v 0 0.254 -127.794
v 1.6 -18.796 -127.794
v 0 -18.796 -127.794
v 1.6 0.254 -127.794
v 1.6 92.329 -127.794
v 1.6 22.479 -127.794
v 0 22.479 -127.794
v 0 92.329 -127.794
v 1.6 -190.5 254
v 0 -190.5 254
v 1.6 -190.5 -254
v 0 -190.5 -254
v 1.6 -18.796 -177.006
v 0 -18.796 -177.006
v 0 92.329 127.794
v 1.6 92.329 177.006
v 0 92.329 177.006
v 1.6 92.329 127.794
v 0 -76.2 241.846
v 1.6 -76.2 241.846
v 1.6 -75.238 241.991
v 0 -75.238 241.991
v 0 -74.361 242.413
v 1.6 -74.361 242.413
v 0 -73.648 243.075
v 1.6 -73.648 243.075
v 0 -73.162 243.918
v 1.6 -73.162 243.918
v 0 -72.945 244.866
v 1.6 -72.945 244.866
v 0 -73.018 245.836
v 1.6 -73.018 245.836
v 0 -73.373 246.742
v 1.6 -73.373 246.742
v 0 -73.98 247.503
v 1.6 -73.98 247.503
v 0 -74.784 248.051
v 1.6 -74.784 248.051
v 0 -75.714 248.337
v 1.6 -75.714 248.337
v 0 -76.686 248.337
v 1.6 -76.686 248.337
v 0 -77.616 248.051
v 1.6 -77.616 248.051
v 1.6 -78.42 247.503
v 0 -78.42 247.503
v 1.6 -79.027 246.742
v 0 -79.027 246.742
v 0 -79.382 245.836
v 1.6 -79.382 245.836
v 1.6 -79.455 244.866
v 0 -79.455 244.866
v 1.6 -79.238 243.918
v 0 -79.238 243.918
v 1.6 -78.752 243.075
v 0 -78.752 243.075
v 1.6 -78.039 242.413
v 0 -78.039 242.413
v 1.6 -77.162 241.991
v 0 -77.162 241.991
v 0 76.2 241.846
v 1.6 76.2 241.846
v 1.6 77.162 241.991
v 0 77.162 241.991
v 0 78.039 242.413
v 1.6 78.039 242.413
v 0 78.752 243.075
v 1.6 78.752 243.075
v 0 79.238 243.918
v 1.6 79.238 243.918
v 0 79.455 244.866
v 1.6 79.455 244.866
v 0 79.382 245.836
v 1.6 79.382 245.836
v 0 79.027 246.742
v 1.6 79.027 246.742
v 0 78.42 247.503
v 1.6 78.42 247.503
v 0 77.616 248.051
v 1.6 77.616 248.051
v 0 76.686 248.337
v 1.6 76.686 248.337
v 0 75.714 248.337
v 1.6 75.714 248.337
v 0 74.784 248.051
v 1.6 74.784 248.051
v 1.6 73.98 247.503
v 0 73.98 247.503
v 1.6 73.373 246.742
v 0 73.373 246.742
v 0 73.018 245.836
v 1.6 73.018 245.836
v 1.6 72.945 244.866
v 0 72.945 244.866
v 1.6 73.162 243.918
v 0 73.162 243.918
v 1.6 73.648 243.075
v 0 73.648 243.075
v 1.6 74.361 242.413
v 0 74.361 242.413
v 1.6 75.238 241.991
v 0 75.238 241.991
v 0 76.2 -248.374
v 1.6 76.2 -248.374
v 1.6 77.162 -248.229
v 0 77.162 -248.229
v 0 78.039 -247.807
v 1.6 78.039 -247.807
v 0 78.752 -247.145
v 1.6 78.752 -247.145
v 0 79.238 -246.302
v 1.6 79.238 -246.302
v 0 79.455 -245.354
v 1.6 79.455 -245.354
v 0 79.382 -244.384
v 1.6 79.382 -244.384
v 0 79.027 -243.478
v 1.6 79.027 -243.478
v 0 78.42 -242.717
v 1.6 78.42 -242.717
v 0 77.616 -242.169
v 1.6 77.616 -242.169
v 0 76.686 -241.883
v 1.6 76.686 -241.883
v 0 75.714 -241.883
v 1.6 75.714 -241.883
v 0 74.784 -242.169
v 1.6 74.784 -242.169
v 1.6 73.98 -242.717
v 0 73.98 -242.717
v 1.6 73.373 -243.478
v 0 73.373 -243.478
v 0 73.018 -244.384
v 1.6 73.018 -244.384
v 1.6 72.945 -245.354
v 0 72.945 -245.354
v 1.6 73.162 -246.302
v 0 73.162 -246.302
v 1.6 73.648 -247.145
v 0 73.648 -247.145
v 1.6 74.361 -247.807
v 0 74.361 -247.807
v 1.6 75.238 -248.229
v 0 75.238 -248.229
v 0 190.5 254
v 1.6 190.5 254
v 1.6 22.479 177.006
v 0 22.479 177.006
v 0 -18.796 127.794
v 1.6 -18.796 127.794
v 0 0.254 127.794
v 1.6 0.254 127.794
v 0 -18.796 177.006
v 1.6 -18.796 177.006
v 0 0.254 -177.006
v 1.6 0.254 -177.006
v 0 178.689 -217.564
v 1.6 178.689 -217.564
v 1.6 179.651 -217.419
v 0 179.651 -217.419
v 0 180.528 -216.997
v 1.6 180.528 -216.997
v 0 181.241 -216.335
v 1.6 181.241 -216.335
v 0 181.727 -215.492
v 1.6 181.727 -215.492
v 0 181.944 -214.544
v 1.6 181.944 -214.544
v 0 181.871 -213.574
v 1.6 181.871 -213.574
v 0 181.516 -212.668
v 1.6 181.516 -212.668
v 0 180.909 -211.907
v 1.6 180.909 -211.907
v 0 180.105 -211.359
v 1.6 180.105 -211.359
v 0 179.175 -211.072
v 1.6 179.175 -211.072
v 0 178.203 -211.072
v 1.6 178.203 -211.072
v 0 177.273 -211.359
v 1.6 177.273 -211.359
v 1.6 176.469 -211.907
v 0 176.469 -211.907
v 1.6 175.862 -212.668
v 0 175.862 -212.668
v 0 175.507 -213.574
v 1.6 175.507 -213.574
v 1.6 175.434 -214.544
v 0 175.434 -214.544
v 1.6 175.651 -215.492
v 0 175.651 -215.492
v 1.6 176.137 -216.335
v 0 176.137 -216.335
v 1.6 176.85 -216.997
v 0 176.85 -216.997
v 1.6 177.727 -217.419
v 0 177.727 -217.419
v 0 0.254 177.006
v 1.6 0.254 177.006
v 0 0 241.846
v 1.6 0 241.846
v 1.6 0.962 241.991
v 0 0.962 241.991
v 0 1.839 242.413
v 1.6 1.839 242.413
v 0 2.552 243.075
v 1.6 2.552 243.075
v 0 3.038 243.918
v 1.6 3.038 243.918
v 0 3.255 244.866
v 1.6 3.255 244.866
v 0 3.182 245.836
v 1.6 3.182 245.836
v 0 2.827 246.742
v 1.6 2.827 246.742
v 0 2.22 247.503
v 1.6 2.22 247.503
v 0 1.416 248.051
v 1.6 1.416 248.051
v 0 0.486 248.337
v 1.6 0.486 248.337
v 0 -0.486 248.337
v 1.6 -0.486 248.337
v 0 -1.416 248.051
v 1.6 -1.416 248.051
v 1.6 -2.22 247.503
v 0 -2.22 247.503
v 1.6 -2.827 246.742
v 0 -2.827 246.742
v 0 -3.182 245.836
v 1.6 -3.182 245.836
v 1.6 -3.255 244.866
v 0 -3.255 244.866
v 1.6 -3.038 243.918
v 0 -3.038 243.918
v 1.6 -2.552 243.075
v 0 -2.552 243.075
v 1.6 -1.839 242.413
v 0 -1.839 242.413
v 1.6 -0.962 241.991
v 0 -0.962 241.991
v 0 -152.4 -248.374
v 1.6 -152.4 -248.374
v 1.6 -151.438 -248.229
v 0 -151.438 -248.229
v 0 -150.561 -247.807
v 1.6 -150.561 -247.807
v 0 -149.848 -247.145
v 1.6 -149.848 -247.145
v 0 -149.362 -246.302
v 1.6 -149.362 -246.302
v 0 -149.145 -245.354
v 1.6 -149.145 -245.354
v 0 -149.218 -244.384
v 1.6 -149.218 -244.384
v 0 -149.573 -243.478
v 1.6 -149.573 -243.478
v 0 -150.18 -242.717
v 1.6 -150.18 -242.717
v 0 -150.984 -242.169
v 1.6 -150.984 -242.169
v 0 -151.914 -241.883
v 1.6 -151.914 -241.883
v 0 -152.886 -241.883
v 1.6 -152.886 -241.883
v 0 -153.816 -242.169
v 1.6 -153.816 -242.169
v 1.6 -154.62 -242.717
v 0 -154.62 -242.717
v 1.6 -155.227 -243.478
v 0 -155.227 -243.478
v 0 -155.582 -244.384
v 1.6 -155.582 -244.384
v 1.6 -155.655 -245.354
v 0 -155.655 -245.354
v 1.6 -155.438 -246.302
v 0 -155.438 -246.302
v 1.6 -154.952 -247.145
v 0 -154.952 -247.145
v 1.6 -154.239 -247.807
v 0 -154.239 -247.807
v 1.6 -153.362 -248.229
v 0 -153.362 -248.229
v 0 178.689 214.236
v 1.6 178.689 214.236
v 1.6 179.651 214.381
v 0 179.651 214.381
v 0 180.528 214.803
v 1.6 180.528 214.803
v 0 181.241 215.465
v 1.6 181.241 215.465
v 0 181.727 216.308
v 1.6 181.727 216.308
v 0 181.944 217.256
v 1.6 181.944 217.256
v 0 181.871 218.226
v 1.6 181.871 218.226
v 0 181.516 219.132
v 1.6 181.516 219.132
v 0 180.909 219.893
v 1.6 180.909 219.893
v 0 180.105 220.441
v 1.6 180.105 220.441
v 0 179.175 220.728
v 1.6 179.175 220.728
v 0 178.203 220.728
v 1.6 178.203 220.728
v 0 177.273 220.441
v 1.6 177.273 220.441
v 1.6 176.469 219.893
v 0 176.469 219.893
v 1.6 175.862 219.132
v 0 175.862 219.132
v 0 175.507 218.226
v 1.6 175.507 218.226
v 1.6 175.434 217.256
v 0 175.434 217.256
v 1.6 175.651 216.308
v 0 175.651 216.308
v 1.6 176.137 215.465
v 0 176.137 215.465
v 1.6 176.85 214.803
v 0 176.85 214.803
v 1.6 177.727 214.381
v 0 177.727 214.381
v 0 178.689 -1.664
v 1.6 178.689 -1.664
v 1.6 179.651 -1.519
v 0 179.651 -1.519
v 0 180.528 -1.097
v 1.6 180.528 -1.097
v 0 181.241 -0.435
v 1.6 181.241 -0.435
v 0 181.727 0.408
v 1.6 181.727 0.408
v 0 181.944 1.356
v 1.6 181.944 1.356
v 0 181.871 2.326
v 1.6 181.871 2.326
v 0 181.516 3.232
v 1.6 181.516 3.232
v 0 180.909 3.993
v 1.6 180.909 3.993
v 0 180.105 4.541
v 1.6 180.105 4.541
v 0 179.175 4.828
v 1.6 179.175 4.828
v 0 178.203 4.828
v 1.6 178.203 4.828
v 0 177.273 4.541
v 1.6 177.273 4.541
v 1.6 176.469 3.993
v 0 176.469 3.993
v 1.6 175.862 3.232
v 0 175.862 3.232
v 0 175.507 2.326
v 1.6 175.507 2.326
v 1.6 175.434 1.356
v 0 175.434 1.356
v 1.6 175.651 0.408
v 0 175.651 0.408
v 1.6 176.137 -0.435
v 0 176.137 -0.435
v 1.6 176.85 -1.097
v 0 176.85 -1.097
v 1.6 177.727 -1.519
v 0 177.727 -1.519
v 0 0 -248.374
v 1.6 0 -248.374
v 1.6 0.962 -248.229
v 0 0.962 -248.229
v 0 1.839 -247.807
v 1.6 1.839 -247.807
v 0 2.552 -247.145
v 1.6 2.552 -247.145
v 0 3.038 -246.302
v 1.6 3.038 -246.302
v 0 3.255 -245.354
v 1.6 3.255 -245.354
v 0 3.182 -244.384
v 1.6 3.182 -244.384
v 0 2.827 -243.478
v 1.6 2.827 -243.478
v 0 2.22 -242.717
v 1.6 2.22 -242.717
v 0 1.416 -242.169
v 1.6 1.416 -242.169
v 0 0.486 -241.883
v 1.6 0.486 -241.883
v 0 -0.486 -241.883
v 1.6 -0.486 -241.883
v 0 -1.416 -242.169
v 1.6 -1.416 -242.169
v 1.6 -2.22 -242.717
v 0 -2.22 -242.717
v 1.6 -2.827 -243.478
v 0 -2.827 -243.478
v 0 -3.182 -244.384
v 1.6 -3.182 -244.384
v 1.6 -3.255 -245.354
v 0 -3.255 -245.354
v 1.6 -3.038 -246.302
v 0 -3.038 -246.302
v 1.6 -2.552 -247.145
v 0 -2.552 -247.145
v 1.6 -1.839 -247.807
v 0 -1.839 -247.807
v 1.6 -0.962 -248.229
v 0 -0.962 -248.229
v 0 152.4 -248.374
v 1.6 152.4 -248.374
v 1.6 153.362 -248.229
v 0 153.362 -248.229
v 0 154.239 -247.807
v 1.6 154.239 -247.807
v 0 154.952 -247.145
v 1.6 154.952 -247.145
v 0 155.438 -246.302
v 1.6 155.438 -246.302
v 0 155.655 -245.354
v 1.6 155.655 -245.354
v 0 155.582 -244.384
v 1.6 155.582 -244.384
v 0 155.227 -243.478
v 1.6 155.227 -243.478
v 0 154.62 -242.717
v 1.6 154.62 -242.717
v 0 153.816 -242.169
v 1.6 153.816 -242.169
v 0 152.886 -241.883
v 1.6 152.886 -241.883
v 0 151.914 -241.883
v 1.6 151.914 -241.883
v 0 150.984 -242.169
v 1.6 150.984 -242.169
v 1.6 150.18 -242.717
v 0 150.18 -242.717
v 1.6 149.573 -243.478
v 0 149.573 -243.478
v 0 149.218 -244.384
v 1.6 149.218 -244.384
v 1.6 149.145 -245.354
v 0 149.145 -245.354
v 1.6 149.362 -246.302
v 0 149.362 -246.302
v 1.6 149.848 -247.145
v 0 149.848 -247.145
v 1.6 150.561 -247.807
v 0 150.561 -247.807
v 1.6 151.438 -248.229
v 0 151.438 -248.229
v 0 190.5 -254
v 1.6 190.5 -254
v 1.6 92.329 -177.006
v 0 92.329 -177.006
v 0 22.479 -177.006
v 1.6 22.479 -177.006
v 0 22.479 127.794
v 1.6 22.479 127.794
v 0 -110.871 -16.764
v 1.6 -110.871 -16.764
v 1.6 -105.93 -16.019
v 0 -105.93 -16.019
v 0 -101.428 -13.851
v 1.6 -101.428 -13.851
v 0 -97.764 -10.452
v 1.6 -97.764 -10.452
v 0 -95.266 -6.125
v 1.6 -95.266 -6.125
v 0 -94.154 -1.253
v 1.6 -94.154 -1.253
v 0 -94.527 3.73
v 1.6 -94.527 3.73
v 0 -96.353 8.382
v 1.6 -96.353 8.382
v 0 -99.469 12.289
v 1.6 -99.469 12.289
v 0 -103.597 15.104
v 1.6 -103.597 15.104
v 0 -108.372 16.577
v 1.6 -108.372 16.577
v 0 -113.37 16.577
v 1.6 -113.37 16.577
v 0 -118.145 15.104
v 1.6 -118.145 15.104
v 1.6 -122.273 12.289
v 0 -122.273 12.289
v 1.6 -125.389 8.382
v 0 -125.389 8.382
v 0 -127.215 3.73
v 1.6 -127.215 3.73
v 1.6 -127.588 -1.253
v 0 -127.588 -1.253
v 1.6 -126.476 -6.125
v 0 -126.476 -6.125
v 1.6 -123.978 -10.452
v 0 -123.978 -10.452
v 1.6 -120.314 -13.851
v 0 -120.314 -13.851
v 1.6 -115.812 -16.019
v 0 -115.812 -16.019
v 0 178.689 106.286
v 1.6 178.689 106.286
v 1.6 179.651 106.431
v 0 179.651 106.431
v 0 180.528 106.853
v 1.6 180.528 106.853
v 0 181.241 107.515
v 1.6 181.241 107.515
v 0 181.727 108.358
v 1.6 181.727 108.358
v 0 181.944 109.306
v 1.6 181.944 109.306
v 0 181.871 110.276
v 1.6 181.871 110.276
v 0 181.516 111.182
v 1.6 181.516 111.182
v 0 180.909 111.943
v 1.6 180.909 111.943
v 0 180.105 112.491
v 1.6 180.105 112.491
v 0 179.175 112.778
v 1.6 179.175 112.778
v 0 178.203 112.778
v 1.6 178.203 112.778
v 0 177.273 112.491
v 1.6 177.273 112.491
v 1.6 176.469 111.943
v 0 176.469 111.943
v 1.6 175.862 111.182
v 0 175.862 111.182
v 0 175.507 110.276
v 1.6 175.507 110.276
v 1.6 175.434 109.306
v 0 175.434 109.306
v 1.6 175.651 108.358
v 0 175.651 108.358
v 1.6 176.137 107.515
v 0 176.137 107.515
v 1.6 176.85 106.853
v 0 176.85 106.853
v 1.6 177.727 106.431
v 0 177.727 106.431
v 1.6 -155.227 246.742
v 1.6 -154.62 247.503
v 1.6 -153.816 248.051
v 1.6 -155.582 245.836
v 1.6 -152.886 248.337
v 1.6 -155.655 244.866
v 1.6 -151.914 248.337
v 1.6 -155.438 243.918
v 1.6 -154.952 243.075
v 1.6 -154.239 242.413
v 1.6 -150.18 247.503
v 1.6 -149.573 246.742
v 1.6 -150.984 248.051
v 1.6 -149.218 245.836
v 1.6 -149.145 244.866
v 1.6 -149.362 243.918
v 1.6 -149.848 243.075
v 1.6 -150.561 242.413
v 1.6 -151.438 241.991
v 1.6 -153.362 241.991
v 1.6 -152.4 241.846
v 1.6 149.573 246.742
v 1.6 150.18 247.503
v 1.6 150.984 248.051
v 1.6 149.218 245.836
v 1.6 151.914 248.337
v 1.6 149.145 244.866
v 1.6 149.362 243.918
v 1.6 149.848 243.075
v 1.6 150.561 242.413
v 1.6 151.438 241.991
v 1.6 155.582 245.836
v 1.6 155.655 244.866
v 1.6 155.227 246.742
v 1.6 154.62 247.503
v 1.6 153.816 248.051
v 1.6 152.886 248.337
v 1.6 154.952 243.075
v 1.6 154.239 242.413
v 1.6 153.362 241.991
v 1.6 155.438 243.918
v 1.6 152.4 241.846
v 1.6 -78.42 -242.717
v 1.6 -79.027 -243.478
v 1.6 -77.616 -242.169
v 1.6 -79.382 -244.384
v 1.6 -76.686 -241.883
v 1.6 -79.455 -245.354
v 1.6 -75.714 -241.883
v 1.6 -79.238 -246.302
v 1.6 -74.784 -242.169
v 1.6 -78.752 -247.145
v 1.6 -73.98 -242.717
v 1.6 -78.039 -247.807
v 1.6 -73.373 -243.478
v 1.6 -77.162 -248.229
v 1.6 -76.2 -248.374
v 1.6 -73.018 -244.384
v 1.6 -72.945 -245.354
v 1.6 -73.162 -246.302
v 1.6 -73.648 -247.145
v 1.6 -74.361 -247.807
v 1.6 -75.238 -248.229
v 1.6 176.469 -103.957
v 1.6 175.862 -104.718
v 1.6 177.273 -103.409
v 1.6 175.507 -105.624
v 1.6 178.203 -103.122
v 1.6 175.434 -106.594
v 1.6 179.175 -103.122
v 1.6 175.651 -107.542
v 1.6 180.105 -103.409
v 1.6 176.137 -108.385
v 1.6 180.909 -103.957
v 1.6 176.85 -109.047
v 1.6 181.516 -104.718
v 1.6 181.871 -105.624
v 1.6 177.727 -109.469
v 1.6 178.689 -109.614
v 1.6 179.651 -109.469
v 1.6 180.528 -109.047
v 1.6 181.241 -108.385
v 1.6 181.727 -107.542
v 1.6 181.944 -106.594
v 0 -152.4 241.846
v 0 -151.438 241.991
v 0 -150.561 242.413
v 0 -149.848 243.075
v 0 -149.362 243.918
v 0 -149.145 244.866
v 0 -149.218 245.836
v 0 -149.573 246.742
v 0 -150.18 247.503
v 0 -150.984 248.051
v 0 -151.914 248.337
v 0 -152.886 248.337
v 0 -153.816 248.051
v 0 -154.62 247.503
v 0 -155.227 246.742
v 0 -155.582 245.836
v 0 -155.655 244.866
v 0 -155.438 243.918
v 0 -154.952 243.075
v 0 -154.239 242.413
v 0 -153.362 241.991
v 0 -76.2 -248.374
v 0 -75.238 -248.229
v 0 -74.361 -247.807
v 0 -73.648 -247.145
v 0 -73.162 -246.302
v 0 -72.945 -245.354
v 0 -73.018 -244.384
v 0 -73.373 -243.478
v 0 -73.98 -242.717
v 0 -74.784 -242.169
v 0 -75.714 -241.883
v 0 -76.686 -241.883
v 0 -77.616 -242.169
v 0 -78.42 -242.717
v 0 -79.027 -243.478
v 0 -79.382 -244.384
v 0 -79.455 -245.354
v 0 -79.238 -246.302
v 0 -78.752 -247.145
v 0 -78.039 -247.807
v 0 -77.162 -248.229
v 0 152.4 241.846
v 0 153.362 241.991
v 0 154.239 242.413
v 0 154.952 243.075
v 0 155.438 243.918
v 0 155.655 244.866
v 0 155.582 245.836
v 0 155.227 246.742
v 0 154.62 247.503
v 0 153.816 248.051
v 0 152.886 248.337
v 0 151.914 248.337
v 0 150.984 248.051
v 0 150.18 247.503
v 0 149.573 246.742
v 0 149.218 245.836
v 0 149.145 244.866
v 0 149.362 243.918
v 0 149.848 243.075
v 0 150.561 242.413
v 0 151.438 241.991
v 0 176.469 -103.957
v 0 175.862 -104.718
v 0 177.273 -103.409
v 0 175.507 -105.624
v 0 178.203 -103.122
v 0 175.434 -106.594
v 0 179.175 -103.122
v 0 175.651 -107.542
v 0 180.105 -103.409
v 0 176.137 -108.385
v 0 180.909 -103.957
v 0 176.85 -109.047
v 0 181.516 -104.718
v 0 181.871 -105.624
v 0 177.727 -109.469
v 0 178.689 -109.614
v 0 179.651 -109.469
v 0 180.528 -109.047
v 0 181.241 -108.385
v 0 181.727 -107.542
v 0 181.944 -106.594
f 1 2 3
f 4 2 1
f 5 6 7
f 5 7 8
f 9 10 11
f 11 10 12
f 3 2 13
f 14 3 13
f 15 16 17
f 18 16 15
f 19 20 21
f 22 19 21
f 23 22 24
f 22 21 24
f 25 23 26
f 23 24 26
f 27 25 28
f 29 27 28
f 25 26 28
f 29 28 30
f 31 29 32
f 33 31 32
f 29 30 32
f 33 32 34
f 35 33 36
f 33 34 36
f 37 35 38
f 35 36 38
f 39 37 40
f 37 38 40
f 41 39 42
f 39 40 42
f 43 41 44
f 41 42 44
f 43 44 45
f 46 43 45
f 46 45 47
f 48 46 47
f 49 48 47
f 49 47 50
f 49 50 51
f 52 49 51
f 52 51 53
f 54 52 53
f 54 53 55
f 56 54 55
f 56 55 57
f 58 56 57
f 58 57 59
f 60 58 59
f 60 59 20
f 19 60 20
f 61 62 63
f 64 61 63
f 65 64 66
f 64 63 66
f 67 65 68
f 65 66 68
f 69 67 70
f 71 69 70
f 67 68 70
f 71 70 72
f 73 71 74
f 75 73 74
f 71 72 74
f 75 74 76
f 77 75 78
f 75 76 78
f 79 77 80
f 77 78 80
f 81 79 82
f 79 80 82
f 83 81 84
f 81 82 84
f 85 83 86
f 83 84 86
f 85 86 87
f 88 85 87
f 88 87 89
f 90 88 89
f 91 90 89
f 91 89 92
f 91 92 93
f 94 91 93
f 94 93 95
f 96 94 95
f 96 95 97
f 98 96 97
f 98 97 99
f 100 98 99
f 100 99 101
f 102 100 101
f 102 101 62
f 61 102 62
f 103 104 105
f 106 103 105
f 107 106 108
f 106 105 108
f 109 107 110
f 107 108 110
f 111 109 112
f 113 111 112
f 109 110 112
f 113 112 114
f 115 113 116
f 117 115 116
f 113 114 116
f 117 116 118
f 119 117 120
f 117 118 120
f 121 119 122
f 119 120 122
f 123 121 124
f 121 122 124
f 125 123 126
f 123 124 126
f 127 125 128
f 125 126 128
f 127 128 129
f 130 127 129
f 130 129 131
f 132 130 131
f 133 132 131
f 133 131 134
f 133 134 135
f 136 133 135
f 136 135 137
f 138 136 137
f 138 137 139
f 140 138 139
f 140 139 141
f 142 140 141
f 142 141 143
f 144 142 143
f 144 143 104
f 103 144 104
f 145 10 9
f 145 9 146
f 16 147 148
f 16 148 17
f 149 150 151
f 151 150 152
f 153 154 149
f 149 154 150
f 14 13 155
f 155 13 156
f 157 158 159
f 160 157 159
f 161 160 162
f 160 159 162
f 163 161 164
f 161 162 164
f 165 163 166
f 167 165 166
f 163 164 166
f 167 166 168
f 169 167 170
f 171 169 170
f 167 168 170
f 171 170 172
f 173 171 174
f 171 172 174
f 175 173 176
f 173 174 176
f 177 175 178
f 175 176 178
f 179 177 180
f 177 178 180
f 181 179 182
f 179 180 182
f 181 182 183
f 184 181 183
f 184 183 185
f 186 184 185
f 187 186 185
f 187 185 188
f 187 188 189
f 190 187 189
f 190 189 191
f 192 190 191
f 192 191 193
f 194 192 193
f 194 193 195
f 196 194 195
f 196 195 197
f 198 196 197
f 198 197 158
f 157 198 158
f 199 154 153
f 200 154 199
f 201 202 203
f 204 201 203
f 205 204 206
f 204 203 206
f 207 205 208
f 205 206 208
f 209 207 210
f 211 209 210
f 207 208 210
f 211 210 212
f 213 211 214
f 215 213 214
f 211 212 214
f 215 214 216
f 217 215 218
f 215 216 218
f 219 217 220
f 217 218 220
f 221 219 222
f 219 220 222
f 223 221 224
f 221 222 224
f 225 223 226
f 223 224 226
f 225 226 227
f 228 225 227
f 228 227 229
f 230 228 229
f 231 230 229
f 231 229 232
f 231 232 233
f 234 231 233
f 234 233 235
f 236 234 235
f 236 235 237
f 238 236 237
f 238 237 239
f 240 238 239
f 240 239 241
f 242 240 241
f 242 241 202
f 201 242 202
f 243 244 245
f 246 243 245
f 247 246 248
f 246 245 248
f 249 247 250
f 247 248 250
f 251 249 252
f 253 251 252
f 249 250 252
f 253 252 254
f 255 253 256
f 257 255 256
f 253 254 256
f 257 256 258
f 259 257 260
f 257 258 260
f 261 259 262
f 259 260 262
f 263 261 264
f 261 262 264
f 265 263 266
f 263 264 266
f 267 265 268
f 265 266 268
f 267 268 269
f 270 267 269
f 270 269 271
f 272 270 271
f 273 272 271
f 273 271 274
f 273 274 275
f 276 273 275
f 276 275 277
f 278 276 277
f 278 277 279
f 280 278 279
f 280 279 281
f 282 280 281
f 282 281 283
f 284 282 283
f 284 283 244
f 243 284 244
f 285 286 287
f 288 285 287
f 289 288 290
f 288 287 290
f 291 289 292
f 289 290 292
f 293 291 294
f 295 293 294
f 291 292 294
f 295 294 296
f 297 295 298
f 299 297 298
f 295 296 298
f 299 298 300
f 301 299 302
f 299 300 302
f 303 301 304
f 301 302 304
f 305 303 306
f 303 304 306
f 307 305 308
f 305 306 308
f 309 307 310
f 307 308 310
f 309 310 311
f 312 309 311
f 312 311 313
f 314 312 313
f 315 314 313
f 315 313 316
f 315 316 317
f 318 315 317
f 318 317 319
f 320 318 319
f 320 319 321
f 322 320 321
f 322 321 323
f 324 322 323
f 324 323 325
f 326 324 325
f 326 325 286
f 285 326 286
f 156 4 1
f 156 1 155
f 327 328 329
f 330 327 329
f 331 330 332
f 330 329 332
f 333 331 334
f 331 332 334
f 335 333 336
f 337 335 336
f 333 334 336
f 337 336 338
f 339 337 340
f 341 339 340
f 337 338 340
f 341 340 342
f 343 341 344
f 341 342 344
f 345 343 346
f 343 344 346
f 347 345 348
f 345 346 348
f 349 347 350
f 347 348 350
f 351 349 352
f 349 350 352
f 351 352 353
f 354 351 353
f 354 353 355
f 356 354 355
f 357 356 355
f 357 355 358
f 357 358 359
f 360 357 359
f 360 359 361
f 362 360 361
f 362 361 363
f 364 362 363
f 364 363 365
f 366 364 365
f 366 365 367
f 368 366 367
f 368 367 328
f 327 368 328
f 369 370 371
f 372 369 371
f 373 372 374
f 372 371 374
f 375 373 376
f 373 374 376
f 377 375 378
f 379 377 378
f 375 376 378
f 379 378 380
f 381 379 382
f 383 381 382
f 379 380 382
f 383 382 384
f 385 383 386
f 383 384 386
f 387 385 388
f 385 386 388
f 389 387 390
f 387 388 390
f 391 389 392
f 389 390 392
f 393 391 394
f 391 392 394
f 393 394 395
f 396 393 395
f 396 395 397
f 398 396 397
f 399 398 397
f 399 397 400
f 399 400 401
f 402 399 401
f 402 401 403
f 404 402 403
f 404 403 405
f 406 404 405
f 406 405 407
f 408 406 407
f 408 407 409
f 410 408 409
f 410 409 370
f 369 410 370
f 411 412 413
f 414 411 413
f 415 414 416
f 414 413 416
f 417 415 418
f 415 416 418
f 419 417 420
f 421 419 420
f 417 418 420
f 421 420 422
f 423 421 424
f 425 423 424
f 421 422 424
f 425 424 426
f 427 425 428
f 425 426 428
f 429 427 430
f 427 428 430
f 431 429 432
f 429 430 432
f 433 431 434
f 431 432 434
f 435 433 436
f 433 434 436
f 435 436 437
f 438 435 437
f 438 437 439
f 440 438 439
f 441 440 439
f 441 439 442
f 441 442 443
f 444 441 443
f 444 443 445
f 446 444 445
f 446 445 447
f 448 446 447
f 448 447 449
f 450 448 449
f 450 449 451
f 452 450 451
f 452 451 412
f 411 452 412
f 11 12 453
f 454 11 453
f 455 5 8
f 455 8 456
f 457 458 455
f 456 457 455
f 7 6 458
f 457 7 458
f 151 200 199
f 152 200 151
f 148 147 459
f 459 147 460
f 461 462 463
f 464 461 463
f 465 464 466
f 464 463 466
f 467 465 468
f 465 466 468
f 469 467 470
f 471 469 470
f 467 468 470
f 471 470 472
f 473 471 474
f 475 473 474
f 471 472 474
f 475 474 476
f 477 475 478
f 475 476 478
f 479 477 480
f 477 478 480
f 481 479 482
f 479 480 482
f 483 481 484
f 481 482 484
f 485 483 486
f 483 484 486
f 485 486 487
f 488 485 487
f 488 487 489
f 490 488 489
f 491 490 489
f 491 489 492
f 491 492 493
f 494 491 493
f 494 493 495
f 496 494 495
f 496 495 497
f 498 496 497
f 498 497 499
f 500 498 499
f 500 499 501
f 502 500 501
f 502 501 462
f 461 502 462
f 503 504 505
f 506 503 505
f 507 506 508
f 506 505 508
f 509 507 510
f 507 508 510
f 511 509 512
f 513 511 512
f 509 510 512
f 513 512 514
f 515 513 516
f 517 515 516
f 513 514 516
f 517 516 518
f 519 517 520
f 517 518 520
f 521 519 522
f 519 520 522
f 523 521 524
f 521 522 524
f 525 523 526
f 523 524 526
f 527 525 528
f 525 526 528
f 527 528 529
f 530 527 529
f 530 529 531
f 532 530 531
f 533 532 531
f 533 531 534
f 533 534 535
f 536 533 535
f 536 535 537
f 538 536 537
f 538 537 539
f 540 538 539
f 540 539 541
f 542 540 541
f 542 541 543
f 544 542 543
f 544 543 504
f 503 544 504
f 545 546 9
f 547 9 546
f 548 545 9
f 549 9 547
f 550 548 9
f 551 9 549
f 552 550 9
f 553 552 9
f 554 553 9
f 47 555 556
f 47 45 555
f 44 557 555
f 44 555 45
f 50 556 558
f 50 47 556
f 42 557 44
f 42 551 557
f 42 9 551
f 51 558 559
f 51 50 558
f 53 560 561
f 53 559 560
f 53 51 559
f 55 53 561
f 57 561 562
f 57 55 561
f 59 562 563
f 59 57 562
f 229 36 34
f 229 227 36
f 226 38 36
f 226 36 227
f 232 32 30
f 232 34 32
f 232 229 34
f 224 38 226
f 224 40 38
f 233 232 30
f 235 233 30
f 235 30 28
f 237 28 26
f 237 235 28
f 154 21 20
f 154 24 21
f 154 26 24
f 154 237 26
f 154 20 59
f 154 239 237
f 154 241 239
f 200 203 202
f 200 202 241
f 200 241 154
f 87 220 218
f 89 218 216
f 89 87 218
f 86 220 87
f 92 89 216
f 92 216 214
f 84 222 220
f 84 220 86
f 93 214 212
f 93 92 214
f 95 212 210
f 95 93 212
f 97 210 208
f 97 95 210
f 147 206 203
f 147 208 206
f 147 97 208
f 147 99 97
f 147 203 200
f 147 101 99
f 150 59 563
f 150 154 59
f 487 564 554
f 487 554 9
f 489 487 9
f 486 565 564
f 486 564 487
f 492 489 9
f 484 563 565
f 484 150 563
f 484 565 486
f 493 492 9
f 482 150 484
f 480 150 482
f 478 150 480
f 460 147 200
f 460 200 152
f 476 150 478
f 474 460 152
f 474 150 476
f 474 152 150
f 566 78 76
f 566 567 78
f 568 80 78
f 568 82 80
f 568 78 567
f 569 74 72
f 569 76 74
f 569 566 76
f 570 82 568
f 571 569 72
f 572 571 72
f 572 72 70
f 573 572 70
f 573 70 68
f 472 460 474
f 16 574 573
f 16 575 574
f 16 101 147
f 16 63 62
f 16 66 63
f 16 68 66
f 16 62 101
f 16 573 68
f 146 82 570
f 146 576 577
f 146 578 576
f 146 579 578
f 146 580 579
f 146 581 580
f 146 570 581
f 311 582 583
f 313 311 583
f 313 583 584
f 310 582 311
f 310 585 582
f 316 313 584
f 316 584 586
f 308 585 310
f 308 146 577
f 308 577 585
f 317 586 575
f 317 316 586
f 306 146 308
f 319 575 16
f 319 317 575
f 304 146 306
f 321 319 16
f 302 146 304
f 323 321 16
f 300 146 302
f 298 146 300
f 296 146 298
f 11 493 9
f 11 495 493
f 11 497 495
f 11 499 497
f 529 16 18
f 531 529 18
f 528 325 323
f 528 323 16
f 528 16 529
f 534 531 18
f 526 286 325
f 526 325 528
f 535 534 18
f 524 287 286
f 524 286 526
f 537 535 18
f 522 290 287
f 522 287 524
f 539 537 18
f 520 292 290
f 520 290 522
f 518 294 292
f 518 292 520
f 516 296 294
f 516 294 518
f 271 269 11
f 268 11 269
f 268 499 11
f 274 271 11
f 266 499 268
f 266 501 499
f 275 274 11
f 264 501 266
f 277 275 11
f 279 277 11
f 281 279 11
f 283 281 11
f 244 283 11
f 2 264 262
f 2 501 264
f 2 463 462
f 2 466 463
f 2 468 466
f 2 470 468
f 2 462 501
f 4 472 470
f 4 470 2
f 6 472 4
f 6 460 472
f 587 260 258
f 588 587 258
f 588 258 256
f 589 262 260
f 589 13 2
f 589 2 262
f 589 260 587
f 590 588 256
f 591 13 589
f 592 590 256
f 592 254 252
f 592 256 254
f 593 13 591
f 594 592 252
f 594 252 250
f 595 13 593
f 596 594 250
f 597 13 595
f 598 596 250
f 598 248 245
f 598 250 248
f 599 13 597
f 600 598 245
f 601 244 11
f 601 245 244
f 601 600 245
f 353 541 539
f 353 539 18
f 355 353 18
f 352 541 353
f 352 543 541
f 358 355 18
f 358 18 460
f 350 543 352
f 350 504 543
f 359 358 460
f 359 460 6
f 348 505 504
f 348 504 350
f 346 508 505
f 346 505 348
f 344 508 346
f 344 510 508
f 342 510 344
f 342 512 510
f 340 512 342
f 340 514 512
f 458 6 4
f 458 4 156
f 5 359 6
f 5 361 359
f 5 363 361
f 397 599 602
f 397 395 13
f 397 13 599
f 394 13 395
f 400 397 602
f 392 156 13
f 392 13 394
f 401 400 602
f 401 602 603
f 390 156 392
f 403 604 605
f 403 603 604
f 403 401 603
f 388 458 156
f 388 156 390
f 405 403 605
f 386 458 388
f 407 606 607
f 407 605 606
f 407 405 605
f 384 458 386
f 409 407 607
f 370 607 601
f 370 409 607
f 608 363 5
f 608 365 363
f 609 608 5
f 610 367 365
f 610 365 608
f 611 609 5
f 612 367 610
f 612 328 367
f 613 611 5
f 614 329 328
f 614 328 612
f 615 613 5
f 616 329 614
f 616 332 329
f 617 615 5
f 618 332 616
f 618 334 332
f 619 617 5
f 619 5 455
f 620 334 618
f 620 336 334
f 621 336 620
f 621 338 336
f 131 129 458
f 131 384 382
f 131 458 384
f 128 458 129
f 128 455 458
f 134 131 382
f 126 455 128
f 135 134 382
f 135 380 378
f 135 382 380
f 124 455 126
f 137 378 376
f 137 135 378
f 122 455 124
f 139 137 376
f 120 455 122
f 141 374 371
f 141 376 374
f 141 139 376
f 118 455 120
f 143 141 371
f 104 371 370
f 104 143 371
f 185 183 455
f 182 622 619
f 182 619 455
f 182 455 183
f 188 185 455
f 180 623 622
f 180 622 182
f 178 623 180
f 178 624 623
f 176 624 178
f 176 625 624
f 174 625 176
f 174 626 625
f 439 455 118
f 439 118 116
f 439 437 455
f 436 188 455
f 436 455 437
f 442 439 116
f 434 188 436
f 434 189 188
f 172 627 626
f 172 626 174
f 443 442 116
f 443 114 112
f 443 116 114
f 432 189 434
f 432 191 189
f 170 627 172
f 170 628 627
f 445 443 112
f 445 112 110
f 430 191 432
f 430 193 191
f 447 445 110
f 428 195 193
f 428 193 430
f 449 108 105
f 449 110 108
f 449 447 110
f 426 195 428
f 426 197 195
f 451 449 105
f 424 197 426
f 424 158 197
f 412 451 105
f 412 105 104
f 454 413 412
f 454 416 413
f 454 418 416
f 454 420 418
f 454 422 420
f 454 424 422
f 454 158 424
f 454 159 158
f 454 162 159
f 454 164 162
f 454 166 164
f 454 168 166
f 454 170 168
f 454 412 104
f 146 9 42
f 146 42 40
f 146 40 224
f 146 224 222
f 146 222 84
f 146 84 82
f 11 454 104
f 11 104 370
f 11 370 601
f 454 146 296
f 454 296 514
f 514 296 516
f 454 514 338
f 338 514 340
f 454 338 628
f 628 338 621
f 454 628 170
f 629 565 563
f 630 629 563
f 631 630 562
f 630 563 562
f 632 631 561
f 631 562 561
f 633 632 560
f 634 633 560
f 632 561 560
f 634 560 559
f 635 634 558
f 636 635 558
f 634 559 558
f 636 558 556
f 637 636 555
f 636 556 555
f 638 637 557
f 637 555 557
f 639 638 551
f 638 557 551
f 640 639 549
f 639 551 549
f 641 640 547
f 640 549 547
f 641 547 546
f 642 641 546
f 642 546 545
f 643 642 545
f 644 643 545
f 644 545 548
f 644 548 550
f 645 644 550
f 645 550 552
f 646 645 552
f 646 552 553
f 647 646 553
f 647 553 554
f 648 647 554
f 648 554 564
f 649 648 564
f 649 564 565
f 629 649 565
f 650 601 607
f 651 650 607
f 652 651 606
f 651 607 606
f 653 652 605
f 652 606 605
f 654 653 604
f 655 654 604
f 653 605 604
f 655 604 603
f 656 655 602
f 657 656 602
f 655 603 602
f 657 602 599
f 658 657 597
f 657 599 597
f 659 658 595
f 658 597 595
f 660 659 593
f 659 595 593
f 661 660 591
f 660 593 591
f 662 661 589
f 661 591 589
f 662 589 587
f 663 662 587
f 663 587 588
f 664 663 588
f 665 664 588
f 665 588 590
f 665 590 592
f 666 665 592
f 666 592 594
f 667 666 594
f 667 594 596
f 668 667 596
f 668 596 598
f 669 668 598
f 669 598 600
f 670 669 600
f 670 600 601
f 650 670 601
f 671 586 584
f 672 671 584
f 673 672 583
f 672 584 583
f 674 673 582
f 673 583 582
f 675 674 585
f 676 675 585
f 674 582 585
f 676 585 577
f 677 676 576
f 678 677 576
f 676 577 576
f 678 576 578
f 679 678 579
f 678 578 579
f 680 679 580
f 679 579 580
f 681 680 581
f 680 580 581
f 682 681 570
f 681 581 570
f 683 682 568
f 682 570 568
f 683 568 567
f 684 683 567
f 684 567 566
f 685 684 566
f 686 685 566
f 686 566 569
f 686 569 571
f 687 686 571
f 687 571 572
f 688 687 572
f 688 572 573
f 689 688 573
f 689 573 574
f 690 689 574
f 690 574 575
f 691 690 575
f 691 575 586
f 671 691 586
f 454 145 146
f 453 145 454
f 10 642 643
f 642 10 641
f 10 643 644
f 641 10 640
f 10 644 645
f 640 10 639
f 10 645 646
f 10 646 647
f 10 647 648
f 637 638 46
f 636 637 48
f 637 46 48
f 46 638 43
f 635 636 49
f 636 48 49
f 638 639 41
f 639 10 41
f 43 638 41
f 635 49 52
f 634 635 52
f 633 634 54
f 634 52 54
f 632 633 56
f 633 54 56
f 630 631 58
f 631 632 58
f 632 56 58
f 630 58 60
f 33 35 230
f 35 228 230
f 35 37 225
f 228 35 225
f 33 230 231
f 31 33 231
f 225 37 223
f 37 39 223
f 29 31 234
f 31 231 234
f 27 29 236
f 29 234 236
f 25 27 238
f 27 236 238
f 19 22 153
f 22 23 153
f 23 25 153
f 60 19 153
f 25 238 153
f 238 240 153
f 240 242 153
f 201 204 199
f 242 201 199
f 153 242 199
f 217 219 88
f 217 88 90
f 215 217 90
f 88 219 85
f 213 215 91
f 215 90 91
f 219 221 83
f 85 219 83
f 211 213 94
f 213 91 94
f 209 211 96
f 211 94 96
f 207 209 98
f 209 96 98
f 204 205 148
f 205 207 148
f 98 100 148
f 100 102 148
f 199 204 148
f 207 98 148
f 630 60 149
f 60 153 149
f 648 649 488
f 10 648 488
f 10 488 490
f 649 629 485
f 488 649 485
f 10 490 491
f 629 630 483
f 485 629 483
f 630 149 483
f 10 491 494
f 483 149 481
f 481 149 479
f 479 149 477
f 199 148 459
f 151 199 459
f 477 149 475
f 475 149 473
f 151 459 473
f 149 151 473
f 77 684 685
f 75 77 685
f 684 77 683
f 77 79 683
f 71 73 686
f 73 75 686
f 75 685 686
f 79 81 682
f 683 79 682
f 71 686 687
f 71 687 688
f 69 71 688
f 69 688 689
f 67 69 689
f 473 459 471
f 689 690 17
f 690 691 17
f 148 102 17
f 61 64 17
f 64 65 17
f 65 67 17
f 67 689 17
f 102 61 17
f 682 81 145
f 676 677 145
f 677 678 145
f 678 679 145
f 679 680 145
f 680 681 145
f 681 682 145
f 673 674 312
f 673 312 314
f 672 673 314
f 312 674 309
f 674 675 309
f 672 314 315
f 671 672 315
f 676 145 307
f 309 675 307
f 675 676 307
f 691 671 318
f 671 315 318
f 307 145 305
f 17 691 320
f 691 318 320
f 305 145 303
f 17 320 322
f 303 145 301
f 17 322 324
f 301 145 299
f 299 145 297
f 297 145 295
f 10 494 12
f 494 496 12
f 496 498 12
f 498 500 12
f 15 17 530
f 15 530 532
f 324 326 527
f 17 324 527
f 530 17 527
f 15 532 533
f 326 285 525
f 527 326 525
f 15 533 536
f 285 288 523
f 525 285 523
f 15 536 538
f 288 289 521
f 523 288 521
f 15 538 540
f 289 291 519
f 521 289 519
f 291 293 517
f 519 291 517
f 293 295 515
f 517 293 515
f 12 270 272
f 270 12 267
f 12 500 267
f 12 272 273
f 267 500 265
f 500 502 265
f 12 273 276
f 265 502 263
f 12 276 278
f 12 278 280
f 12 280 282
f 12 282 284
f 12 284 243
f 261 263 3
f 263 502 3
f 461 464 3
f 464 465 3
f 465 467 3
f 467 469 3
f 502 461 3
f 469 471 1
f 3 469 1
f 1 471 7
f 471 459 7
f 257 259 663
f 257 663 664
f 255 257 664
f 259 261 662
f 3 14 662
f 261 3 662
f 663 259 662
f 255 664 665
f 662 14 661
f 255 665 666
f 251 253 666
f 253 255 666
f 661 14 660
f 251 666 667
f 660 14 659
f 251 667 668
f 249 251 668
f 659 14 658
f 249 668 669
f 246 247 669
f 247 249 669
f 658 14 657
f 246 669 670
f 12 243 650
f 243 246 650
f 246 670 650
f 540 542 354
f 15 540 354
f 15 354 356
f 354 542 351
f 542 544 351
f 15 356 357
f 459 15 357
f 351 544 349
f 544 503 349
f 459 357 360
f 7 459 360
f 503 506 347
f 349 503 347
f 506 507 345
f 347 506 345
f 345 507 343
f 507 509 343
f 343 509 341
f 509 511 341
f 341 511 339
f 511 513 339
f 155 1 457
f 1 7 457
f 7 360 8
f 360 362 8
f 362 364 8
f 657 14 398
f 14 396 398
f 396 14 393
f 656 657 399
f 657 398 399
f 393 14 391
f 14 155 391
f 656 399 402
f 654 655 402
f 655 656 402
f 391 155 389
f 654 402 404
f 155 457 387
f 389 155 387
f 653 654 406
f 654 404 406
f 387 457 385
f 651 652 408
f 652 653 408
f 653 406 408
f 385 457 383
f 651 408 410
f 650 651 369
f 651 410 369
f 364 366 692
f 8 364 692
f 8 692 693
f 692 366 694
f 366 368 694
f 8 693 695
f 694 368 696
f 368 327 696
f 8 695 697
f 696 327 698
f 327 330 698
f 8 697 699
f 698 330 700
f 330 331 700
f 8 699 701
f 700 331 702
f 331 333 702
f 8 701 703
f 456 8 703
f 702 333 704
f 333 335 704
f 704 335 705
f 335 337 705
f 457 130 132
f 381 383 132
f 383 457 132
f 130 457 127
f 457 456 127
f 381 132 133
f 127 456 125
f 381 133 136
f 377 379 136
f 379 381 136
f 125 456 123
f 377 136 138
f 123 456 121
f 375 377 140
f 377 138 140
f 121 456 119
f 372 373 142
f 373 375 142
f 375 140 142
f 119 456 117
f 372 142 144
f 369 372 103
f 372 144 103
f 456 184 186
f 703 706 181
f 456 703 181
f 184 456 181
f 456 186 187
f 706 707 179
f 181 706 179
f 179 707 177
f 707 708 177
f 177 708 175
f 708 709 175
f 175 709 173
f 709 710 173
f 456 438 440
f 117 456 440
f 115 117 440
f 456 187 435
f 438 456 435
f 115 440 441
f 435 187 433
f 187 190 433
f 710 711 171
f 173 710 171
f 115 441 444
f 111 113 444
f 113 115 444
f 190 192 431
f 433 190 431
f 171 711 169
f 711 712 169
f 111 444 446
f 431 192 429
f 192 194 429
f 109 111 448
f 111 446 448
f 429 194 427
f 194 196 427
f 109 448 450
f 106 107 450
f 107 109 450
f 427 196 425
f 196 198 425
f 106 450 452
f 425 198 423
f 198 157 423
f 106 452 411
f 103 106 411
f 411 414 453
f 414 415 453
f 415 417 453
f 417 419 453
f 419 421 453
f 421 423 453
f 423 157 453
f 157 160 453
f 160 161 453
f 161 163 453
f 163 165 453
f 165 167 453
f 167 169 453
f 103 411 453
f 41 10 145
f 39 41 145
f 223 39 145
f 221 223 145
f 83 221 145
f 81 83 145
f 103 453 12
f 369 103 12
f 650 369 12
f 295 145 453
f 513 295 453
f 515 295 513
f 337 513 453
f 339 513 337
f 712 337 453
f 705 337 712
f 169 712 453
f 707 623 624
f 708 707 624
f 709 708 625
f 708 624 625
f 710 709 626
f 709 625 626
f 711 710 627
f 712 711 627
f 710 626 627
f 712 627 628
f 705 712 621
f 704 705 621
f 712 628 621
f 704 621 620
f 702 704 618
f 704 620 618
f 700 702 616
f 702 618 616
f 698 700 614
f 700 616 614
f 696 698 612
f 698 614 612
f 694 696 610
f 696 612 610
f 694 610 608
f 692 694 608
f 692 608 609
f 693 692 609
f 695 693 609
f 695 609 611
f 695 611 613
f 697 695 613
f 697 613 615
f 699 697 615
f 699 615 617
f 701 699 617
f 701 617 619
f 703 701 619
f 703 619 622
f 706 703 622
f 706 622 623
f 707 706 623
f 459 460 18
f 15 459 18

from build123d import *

# Parameters (mm, degrees)
SKETCH1_W           = 508
SKETCH1_H           = 381
BOSS_EXTRUDE1_DEPTH = 1.6002
SKETCH5_R           = 3.2639
CUT_EXTRUDE1_DEPTH  = 2.54
SKETCH7_R           = 3.2639
CUT_EXTRUDE3_DEPTH  = 2.54
SKETCH8_W           = 49.2125
SKETCH8_H           = 69.85
SKETCH8_H_2         = 19.05
CUT_EXTRUDE4_DEPTH  = 318.504032478
SKETCH9_R           = 16.764
CUT_EXTRUDE5_DEPTH  = 318.504032478


with BuildPart() as part:
    # Sketch1 → Boss-Extrude1 (new body)
    with BuildSketch(Plane(origin=(0, 0, 0), x_dir=(0, 0, -1), z_dir=(1, 0, 0))):
        Rectangle(SKETCH1_W, SKETCH1_H)
    extrude(amount=BOSS_EXTRUDE1_DEPTH)

    # Sketch5 → Cut-Extrude1 (cut)
    with BuildSketch(Plane(origin=(1.6002, 0, 0), x_dir=(0, 0, -1), z_dir=(1, 0, 0))):
        with Locations((-245.11, 152.4)):
            Circle(SKETCH5_R)
        with Locations((-245.11, 76.2)):
            Circle(SKETCH5_R)
        with Locations((-245.11, 0)):
            Circle(SKETCH5_R)
        with Locations((-245.11, -76.2)):
            Circle(SKETCH5_R)
        with Locations((-245.11, -152.4)):
            Circle(SKETCH5_R)
        with Locations((245.11, 152.4)):
            Circle(SKETCH5_R)
        with Locations((245.11, 76.2)):
            Circle(SKETCH5_R)
        with Locations((245.11, 0)):
            Circle(SKETCH5_R)
        with Locations((245.11, -76.2)):
            Circle(SKETCH5_R)
        with Locations((245.11, -152.4)):
            Circle(SKETCH5_R)
    extrude(amount=-CUT_EXTRUDE1_DEPTH, mode=Mode.SUBTRACT)

    # Sketch7 → Cut-Extrude3 (cut)
    with BuildSketch(Plane(origin=(1.6002, 0, 0), x_dir=(0, 0, -1), z_dir=(1, 0, 0))):
        with Locations((-217.5002, 178.689)):
            Circle(SKETCH7_R)
        with Locations((-109.5502, 178.689)):
            Circle(SKETCH7_R)
        with Locations((-1.6002, 178.689)):
            Circle(SKETCH7_R)
        with Locations((106.3498, 178.689)):
            Circle(SKETCH7_R)
        with Locations((214.2998, 178.689)):
            Circle(SKETCH7_R)
    extrude(amount=-CUT_EXTRUDE3_DEPTH, mode=Mode.SUBTRACT)

    # Sketch8 → Cut-Extrude4 (cut, through all)
    with BuildSketch(Plane(origin=(1.6002, 0, 0), x_dir=(0, 0, -1), z_dir=(1, 0, 0))):
        with Locations((-152.4, 57.404)):
            Rectangle(SKETCH8_W, SKETCH8_H)
        with Locations((152.4, 57.404)):
            Rectangle(SKETCH8_W, SKETCH8_H)
        with Locations((152.4, -9.271)):
            Rectangle(SKETCH8_W, SKETCH8_H_2)
        with Locations((-152.4, -9.271)):
            Rectangle(SKETCH8_W, SKETCH8_H_2)
    extrude(amount=-CUT_EXTRUDE4_DEPTH, mode=Mode.SUBTRACT)

    # Sketch9 → Cut-Extrude5 (cut, through all)
    with BuildSketch(Plane(origin=(1.6002, 0, 0), x_dir=(0, 0, -1), z_dir=(1, 0, 0))):
        with Locations((0, -110.871)):
            Circle(SKETCH9_R)
    extrude(amount=-CUT_EXTRUDE5_DEPTH, mode=Mode.SUBTRACT)


solid = part.part
